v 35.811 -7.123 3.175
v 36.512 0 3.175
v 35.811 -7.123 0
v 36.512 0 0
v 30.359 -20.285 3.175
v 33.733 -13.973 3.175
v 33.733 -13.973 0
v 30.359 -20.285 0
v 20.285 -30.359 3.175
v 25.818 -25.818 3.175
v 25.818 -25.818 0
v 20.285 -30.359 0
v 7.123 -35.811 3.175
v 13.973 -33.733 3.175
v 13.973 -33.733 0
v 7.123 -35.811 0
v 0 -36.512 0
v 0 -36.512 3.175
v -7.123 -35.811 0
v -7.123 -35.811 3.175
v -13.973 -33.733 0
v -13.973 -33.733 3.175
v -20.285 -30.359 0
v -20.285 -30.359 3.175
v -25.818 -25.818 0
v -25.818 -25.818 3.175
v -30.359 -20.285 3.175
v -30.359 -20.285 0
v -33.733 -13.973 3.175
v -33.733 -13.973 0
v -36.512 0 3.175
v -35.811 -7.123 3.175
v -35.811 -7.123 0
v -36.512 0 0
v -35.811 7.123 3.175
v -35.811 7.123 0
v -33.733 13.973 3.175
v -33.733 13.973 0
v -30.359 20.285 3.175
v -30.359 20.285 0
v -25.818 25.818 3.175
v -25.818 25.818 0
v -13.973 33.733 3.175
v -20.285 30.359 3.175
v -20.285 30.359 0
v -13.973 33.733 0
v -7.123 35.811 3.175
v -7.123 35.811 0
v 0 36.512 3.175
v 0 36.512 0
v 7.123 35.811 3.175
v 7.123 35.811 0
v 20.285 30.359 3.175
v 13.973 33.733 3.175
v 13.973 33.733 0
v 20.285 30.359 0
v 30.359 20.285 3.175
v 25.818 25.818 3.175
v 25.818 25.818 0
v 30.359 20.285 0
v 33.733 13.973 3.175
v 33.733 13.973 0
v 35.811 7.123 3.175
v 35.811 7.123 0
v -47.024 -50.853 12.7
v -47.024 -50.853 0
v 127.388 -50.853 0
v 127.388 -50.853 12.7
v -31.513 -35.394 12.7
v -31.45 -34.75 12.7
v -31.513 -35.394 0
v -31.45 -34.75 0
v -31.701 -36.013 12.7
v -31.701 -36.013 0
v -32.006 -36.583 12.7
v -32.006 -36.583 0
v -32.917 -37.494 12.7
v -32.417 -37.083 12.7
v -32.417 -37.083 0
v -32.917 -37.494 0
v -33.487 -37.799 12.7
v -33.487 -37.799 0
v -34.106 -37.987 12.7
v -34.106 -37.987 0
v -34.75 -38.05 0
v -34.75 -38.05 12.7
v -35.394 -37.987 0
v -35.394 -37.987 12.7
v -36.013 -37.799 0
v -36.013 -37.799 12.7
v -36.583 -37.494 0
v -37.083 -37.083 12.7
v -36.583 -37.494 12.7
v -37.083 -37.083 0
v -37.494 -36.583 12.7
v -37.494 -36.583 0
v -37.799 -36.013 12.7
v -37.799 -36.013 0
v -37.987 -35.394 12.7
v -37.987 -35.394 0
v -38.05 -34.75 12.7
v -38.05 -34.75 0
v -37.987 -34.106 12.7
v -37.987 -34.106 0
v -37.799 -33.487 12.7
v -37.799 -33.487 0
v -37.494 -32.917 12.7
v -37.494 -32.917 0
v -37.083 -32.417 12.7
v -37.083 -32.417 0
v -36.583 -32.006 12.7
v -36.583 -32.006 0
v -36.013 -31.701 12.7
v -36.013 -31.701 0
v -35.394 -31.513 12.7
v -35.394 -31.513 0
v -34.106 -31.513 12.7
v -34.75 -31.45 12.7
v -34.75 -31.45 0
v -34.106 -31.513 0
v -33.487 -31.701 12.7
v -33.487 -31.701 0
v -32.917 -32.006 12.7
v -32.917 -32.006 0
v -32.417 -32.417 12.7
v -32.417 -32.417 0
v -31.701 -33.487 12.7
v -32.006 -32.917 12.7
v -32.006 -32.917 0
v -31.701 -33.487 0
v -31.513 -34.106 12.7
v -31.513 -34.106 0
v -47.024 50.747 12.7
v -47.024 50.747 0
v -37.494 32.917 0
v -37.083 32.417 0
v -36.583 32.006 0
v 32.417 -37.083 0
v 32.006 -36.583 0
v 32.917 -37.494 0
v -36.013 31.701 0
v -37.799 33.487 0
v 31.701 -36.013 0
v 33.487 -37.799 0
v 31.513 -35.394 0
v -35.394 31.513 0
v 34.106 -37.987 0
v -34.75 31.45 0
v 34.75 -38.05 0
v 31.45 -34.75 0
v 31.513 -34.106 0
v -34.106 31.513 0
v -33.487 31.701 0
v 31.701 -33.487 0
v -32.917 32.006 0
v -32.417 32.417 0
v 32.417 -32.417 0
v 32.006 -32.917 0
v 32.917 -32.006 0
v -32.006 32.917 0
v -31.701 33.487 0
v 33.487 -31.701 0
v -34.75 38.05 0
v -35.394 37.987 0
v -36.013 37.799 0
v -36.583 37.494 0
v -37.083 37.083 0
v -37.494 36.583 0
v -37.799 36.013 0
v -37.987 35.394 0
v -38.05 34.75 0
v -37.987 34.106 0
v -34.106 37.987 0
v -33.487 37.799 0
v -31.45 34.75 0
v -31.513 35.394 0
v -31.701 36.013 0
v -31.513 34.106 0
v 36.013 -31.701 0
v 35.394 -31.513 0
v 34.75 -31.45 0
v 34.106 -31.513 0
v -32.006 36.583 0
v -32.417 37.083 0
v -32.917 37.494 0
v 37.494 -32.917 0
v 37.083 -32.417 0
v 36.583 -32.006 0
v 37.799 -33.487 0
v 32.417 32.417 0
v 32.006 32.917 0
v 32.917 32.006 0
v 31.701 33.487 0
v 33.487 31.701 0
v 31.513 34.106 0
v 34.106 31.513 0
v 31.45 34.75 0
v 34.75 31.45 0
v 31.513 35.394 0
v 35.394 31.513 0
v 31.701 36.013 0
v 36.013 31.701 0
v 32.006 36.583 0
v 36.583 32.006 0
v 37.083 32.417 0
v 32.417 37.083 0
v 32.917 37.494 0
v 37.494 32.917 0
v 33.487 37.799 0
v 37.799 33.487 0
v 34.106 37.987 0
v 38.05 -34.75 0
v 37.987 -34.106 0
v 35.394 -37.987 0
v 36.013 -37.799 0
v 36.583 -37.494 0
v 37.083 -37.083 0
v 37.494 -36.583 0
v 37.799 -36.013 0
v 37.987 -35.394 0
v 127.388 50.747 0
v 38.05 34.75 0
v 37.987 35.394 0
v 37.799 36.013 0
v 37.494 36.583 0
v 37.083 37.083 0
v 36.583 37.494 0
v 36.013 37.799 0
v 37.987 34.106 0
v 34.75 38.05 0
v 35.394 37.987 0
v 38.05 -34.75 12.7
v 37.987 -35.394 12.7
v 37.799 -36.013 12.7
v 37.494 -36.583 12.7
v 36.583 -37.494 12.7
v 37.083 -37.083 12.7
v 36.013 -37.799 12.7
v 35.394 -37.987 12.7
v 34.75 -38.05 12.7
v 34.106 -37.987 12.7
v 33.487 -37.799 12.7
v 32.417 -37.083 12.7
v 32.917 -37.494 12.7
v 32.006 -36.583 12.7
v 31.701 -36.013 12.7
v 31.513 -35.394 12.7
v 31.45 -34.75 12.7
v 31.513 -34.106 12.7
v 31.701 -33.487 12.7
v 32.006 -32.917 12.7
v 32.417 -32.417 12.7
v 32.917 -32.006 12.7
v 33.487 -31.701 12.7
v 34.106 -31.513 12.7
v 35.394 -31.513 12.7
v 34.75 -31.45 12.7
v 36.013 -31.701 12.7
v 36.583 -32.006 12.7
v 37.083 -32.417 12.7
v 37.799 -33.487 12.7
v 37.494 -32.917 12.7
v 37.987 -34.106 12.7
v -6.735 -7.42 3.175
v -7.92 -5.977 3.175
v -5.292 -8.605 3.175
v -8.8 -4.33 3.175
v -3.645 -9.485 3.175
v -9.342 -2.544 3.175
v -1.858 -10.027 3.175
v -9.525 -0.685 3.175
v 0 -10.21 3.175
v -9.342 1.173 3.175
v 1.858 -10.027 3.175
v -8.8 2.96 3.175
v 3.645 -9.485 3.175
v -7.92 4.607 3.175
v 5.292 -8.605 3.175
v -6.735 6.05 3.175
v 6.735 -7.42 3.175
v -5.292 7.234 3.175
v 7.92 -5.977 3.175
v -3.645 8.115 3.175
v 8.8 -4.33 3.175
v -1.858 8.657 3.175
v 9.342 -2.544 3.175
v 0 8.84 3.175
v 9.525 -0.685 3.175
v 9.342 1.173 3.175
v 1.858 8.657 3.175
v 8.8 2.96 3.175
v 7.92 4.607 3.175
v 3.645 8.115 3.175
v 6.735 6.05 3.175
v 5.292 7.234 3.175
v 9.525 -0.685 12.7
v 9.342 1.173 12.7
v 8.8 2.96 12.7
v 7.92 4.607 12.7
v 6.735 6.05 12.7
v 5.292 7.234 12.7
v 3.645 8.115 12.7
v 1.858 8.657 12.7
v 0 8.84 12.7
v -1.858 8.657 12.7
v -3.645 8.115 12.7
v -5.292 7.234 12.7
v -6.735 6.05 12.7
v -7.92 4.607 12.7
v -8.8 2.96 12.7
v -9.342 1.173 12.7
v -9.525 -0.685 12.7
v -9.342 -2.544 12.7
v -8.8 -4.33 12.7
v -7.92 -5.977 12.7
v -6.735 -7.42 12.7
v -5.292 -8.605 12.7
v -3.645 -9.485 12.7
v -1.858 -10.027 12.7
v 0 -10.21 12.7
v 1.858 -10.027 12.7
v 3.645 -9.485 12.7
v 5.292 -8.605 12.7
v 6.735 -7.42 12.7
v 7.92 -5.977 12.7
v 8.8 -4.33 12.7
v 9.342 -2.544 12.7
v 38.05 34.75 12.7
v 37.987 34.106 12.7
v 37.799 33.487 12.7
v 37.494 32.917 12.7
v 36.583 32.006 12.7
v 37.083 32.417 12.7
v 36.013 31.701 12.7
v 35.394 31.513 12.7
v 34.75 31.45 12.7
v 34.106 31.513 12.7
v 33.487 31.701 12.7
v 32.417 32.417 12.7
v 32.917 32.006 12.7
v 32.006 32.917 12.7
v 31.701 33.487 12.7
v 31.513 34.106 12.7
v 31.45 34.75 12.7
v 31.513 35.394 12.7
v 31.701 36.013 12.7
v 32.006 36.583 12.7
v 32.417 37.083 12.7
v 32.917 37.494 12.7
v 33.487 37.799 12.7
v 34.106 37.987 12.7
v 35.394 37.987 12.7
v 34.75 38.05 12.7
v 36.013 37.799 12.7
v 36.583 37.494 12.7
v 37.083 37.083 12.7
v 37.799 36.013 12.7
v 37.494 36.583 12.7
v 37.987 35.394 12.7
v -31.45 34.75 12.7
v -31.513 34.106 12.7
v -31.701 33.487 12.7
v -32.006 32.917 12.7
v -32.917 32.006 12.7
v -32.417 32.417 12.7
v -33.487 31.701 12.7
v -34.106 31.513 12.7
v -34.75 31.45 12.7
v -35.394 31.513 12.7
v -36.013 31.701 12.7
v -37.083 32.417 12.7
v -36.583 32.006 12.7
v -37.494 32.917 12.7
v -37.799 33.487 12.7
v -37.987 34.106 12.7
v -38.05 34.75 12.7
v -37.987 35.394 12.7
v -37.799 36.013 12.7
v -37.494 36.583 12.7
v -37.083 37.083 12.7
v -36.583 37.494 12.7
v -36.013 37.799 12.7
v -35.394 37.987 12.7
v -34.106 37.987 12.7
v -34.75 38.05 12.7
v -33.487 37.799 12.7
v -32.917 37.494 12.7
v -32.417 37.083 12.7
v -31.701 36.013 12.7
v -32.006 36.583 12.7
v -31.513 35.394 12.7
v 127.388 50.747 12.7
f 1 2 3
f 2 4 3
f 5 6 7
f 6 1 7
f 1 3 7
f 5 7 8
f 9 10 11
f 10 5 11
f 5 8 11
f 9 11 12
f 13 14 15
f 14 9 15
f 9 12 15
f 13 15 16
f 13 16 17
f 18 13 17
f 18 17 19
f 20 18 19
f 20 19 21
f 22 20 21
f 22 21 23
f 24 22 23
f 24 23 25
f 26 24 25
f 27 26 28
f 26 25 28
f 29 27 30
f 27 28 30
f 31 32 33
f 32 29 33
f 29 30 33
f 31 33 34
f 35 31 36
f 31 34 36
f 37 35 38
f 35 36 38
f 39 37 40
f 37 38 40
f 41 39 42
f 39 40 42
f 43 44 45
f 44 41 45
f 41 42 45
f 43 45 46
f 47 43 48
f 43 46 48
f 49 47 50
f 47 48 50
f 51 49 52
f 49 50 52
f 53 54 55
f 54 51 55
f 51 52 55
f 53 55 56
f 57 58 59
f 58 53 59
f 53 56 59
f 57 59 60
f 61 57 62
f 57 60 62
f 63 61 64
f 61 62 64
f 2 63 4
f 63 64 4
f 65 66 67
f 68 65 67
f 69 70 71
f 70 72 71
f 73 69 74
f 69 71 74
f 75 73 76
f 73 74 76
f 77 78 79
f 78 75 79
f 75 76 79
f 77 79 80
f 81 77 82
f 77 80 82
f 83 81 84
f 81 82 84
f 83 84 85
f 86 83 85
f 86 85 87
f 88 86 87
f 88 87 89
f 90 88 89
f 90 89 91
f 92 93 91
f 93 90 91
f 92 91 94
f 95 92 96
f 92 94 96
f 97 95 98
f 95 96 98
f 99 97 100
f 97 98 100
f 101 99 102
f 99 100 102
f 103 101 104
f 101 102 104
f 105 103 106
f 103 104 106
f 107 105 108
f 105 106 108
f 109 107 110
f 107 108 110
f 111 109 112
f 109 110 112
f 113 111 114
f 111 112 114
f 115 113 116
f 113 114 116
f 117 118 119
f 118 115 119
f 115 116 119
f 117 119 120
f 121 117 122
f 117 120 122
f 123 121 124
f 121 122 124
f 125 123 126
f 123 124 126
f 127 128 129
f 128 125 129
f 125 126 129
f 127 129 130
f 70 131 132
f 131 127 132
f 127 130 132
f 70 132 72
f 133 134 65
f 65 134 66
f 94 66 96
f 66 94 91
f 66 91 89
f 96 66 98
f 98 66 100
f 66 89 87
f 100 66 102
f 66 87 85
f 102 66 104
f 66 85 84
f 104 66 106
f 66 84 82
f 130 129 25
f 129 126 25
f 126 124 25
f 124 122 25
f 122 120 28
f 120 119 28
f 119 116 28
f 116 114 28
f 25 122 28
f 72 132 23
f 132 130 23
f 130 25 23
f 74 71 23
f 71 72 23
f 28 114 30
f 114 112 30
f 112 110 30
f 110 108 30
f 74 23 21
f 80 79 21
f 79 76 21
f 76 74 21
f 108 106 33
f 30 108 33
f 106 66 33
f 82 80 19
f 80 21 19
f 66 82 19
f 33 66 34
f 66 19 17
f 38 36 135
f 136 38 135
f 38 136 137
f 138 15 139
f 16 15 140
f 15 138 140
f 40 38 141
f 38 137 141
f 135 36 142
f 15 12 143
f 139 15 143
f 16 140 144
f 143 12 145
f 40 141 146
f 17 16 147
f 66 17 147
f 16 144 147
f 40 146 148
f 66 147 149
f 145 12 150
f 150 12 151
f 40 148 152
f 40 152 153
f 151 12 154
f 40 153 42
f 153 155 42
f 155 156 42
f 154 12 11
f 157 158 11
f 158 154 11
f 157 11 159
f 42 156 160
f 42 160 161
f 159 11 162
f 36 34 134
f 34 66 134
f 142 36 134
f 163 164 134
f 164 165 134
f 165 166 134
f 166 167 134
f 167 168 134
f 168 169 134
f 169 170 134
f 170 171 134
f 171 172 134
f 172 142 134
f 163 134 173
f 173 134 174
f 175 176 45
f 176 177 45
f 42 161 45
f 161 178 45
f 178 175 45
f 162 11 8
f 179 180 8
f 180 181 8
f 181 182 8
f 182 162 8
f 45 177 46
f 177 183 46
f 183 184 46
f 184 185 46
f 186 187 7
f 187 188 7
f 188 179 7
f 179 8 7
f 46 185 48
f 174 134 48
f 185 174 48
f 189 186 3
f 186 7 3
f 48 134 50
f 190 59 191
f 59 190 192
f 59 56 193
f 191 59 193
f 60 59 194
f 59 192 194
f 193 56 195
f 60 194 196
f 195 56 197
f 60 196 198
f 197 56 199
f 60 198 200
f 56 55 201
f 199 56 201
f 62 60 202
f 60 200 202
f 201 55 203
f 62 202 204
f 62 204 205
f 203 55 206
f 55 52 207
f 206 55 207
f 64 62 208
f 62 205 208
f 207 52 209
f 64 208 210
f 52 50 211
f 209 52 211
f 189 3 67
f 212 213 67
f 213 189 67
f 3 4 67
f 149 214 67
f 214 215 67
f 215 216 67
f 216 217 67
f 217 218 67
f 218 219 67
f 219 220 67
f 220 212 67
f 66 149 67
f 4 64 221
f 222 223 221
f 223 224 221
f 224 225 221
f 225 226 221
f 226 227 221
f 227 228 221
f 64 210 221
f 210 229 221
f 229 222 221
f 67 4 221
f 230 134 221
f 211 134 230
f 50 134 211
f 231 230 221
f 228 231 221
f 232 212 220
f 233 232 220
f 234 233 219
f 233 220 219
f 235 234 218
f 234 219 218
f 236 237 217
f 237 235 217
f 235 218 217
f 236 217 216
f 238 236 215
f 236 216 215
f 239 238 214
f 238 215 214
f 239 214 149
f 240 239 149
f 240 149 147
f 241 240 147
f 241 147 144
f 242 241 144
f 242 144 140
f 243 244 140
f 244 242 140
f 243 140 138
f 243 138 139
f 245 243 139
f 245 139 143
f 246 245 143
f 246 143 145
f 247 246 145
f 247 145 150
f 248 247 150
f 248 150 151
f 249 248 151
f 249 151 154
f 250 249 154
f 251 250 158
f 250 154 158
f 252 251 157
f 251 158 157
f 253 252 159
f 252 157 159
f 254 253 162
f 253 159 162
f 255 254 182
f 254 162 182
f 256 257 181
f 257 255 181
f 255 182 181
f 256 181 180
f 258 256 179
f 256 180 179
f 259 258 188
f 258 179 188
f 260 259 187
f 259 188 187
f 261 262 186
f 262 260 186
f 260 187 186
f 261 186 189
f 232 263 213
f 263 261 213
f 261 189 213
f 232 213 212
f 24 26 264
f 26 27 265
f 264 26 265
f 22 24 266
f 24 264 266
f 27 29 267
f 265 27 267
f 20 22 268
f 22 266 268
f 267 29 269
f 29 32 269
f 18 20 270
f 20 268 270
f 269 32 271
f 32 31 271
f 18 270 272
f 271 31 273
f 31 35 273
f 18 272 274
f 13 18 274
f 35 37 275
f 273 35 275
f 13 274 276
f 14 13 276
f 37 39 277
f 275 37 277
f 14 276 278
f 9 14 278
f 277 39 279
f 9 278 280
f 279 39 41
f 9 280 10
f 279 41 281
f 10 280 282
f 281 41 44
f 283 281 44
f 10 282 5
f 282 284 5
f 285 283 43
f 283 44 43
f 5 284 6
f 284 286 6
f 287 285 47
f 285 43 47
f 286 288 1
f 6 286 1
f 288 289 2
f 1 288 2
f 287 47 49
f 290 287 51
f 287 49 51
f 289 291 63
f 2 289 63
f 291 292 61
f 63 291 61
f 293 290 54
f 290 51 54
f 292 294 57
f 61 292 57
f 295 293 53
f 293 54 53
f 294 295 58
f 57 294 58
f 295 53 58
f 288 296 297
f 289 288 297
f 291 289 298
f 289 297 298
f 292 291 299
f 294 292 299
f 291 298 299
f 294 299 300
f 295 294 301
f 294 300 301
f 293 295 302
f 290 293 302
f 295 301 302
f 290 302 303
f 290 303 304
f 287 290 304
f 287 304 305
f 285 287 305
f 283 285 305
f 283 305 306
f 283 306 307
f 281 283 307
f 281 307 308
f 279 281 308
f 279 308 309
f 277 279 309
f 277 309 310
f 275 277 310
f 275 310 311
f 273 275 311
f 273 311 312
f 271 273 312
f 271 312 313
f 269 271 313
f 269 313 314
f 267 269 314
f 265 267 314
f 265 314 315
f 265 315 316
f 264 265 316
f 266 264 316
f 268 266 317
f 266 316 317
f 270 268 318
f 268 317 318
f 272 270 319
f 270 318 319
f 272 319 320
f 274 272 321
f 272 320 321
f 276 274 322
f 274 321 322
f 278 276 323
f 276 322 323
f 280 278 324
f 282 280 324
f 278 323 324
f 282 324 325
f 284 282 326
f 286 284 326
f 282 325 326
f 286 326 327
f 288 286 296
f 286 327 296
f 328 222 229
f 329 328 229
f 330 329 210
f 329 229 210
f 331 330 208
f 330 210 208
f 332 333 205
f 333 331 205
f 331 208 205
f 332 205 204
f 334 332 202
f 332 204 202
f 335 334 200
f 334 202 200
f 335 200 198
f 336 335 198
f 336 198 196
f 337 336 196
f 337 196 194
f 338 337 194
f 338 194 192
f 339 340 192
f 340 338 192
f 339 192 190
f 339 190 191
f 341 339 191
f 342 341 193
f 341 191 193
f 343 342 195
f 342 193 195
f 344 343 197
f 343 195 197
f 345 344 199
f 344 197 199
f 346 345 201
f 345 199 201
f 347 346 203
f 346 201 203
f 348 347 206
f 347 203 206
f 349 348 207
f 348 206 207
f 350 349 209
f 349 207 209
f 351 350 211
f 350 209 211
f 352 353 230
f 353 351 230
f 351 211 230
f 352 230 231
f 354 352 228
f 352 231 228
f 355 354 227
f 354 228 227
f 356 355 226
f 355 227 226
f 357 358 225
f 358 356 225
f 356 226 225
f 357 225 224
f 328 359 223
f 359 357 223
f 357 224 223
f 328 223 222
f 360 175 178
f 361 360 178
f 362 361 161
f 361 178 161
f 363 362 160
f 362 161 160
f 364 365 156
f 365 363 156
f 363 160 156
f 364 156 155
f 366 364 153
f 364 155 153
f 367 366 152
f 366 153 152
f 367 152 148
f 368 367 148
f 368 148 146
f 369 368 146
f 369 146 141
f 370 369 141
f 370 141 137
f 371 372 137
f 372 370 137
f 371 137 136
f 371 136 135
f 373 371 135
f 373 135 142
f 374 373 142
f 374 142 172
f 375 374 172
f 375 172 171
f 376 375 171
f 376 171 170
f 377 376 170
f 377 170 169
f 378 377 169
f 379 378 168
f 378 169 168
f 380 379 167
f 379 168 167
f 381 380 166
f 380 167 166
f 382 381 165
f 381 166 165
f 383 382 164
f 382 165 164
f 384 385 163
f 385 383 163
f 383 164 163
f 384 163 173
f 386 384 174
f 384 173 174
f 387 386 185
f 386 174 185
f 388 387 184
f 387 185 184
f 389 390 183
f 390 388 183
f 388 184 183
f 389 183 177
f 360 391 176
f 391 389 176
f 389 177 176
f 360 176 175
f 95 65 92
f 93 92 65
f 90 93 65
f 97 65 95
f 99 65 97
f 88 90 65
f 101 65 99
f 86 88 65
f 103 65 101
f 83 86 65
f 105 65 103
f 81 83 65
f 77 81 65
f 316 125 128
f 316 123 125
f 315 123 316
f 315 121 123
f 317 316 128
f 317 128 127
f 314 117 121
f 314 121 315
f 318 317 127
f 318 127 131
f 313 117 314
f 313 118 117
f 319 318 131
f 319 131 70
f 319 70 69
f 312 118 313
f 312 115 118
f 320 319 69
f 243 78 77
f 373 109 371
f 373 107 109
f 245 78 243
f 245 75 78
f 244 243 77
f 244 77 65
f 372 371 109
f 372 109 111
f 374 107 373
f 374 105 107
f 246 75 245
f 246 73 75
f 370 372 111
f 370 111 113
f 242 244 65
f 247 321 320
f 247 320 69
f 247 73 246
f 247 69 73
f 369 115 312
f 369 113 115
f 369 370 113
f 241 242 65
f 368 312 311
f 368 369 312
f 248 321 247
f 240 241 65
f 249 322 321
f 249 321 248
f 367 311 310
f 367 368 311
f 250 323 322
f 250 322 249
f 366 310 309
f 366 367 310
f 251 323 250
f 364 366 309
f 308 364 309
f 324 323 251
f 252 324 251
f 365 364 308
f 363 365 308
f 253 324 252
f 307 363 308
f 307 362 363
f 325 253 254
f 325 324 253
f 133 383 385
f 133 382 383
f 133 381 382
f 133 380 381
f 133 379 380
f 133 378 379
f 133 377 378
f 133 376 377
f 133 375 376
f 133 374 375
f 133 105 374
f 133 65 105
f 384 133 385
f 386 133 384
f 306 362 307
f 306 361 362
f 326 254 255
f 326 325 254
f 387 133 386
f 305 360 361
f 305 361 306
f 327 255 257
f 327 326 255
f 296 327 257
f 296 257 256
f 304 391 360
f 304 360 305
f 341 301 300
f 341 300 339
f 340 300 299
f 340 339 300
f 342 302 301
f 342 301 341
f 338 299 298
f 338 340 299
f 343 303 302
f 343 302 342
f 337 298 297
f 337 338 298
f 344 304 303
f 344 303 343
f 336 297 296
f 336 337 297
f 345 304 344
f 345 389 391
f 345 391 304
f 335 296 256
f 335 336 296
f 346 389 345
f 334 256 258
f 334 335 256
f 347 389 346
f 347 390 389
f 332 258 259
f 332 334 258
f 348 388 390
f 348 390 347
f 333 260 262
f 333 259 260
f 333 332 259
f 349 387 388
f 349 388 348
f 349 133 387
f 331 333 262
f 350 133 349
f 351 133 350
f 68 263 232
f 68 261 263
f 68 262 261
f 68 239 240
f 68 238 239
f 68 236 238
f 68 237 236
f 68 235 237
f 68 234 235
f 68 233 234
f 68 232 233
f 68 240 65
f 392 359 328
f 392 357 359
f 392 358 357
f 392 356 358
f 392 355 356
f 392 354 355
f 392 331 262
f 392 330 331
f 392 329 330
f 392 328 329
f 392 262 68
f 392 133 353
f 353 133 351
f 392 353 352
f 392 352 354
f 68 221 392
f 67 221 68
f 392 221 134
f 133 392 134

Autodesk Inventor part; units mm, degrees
ref_plane "YZ Plane" through (0, 0, 0) normal (1, 0, 0) x (0, 1, 0)
ref_plane "XZ Plane" through (0, 0, 0) normal (0, 1, 0) x (-1, 0, 0)
ref_plane "XY Plane" through (0, 0, 0) normal (0, 0, 1) x (1, 0, 0)
sketch "Sketch1" plane through (0, 0, 0) normal (0, 0, 1) x (1, 0, 0)
  line L0 (-42.925, -19.7) -> (-38.525, -19.7) projected
  arc A0 (-38.525, -28.9) -> (-38.525, -19.7) centre (-38.525, -24.3) ccw projected
  line L1 (-38.525, -28.9) -> (-42.925, -28.9) projected
  line L2 (-42.925, -37.425) -> (-42.925, -28.9) projected
  arc A1 (-42.925, -37.425) -> (-37.425, -42.925) centre (-37.425, -37.425) ccw projected
  line L3 (19.7, -42.925) -> (-37.425, -42.925) projected
  line L4 (19.7, -42.925) -> (19.7, -38.525) projected
  arc A2 (28.9, -38.525) -> (19.7, -38.525) centre (24.3, -38.525) ccw projected
  line L5 (28.9, -38.525) -> (28.9, -42.925) projected
  line L6 (37.425, -42.925) -> (28.9, -42.925) projected
  arc A3 (37.425, -42.925) -> (42.925, -37.425) centre (37.425, -37.425) ccw projected
  line L7 (42.925, 19.7) -> (42.925, -37.425) projected
  line L8 (42.925, 19.7) -> (38.525, 19.7) projected
  arc A4 (38.525, 28.9) -> (38.525, 19.7) centre (38.525, 24.3) ccw projected
  line L9 (38.525, 28.9) -> (42.925, 28.9) projected
  line L10 (42.925, 37.425) -> (42.925, 28.9) projected
  arc A5 (42.925, 37.425) -> (37.425, 42.925) centre (37.425, 37.425) ccw projected
  line L11 (-19.7, 42.925) -> (37.425, 42.925) projected
  line L12 (-19.7, 42.925) -> (-19.7, 38.525) projected
  arc A6 (-28.9, 38.525) -> (-19.7, 38.525) centre (-24.3, 38.525) ccw projected
  line L13 (-28.9, 38.525) -> (-28.9, 42.925) projected
  line L14 (-37.425, 42.925) -> (-28.9, 42.925) projected
  arc A7 (-37.425, 42.925) -> (-42.925, 37.425) centre (-37.425, 37.425) ccw projected
  line L15 (-42.925, -19.7) -> (-42.925, 37.425) projected
  circle A8 centre (34.75, -34.75) radius 3.3 projected
  circle A9 centre (-34.75, -34.75) radius 3.3 projected
  circle A10 centre (34.75, 34.75) radius 3.3 projected
  circle A11 centre (-34.75, 34.75) radius 3.3 projected
  circle A12 centre (0, 0) radius 36.5125 projected
  line L16 (127.3875, 50.7471) -> (127.3875, -50.8529) projected
  line L17 (127.3875, 50.7471) -> (-47.0237, 50.7471)
  line L18 (-47.0237, 50.7471) -> (-47.0237, -50.8529)
  line L19 (-47.0237, -50.8529) -> (127.3875, -50.8529)
  point P0 (0, 0)
  dimension "d0" = 101.6
extrude "Extrusion1" add sketch "Sketch1" along normal blind 12.7 contours L15 A7 L14 L13 A6 L12 L11 A5 L10 L9 A4 L8 L7 A3 L6 L5 A2 L4 L3 A1 L2 L1 A0 L0 | L16 L19 L18 L17
sketch "Sketch2" plane through (0, 0, 12.7) normal (0, 0, 1) x (1, 0, 0)
  line L0 (127.3875, -50.8529) -> (127.3875, 50.7471) projected
  line L1 (127.3875, 50.7471) -> (-47.0237, 50.7471) projected
  line L2 (-47.0237, 50.7471) -> (-47.0237, -50.8529) projected
  line L3 (-47.0237, -50.8529) -> (127.3875, -50.8529) projected
  circle A0 centre (0, 0) radius 36.5125 projected
  circle A1 centre (34.75, -34.75) radius 3.3 projected
  circle A2 centre (-34.75, 34.75) radius 3.3 projected
  circle A3 centre (34.75, 34.75) radius 3.3 projected
  circle A4 centre (-34.75, -34.75) radius 3.3 projected
  circle A5 centre (0, -0.6853) radius 9.525
  point P0 (0, 0)
  dimension "d3" = 19.05
extrude "Extrusion2" add sketch "Sketch2" against normal blind 9.525 contours A0
properties part number "Stepper Plate"
